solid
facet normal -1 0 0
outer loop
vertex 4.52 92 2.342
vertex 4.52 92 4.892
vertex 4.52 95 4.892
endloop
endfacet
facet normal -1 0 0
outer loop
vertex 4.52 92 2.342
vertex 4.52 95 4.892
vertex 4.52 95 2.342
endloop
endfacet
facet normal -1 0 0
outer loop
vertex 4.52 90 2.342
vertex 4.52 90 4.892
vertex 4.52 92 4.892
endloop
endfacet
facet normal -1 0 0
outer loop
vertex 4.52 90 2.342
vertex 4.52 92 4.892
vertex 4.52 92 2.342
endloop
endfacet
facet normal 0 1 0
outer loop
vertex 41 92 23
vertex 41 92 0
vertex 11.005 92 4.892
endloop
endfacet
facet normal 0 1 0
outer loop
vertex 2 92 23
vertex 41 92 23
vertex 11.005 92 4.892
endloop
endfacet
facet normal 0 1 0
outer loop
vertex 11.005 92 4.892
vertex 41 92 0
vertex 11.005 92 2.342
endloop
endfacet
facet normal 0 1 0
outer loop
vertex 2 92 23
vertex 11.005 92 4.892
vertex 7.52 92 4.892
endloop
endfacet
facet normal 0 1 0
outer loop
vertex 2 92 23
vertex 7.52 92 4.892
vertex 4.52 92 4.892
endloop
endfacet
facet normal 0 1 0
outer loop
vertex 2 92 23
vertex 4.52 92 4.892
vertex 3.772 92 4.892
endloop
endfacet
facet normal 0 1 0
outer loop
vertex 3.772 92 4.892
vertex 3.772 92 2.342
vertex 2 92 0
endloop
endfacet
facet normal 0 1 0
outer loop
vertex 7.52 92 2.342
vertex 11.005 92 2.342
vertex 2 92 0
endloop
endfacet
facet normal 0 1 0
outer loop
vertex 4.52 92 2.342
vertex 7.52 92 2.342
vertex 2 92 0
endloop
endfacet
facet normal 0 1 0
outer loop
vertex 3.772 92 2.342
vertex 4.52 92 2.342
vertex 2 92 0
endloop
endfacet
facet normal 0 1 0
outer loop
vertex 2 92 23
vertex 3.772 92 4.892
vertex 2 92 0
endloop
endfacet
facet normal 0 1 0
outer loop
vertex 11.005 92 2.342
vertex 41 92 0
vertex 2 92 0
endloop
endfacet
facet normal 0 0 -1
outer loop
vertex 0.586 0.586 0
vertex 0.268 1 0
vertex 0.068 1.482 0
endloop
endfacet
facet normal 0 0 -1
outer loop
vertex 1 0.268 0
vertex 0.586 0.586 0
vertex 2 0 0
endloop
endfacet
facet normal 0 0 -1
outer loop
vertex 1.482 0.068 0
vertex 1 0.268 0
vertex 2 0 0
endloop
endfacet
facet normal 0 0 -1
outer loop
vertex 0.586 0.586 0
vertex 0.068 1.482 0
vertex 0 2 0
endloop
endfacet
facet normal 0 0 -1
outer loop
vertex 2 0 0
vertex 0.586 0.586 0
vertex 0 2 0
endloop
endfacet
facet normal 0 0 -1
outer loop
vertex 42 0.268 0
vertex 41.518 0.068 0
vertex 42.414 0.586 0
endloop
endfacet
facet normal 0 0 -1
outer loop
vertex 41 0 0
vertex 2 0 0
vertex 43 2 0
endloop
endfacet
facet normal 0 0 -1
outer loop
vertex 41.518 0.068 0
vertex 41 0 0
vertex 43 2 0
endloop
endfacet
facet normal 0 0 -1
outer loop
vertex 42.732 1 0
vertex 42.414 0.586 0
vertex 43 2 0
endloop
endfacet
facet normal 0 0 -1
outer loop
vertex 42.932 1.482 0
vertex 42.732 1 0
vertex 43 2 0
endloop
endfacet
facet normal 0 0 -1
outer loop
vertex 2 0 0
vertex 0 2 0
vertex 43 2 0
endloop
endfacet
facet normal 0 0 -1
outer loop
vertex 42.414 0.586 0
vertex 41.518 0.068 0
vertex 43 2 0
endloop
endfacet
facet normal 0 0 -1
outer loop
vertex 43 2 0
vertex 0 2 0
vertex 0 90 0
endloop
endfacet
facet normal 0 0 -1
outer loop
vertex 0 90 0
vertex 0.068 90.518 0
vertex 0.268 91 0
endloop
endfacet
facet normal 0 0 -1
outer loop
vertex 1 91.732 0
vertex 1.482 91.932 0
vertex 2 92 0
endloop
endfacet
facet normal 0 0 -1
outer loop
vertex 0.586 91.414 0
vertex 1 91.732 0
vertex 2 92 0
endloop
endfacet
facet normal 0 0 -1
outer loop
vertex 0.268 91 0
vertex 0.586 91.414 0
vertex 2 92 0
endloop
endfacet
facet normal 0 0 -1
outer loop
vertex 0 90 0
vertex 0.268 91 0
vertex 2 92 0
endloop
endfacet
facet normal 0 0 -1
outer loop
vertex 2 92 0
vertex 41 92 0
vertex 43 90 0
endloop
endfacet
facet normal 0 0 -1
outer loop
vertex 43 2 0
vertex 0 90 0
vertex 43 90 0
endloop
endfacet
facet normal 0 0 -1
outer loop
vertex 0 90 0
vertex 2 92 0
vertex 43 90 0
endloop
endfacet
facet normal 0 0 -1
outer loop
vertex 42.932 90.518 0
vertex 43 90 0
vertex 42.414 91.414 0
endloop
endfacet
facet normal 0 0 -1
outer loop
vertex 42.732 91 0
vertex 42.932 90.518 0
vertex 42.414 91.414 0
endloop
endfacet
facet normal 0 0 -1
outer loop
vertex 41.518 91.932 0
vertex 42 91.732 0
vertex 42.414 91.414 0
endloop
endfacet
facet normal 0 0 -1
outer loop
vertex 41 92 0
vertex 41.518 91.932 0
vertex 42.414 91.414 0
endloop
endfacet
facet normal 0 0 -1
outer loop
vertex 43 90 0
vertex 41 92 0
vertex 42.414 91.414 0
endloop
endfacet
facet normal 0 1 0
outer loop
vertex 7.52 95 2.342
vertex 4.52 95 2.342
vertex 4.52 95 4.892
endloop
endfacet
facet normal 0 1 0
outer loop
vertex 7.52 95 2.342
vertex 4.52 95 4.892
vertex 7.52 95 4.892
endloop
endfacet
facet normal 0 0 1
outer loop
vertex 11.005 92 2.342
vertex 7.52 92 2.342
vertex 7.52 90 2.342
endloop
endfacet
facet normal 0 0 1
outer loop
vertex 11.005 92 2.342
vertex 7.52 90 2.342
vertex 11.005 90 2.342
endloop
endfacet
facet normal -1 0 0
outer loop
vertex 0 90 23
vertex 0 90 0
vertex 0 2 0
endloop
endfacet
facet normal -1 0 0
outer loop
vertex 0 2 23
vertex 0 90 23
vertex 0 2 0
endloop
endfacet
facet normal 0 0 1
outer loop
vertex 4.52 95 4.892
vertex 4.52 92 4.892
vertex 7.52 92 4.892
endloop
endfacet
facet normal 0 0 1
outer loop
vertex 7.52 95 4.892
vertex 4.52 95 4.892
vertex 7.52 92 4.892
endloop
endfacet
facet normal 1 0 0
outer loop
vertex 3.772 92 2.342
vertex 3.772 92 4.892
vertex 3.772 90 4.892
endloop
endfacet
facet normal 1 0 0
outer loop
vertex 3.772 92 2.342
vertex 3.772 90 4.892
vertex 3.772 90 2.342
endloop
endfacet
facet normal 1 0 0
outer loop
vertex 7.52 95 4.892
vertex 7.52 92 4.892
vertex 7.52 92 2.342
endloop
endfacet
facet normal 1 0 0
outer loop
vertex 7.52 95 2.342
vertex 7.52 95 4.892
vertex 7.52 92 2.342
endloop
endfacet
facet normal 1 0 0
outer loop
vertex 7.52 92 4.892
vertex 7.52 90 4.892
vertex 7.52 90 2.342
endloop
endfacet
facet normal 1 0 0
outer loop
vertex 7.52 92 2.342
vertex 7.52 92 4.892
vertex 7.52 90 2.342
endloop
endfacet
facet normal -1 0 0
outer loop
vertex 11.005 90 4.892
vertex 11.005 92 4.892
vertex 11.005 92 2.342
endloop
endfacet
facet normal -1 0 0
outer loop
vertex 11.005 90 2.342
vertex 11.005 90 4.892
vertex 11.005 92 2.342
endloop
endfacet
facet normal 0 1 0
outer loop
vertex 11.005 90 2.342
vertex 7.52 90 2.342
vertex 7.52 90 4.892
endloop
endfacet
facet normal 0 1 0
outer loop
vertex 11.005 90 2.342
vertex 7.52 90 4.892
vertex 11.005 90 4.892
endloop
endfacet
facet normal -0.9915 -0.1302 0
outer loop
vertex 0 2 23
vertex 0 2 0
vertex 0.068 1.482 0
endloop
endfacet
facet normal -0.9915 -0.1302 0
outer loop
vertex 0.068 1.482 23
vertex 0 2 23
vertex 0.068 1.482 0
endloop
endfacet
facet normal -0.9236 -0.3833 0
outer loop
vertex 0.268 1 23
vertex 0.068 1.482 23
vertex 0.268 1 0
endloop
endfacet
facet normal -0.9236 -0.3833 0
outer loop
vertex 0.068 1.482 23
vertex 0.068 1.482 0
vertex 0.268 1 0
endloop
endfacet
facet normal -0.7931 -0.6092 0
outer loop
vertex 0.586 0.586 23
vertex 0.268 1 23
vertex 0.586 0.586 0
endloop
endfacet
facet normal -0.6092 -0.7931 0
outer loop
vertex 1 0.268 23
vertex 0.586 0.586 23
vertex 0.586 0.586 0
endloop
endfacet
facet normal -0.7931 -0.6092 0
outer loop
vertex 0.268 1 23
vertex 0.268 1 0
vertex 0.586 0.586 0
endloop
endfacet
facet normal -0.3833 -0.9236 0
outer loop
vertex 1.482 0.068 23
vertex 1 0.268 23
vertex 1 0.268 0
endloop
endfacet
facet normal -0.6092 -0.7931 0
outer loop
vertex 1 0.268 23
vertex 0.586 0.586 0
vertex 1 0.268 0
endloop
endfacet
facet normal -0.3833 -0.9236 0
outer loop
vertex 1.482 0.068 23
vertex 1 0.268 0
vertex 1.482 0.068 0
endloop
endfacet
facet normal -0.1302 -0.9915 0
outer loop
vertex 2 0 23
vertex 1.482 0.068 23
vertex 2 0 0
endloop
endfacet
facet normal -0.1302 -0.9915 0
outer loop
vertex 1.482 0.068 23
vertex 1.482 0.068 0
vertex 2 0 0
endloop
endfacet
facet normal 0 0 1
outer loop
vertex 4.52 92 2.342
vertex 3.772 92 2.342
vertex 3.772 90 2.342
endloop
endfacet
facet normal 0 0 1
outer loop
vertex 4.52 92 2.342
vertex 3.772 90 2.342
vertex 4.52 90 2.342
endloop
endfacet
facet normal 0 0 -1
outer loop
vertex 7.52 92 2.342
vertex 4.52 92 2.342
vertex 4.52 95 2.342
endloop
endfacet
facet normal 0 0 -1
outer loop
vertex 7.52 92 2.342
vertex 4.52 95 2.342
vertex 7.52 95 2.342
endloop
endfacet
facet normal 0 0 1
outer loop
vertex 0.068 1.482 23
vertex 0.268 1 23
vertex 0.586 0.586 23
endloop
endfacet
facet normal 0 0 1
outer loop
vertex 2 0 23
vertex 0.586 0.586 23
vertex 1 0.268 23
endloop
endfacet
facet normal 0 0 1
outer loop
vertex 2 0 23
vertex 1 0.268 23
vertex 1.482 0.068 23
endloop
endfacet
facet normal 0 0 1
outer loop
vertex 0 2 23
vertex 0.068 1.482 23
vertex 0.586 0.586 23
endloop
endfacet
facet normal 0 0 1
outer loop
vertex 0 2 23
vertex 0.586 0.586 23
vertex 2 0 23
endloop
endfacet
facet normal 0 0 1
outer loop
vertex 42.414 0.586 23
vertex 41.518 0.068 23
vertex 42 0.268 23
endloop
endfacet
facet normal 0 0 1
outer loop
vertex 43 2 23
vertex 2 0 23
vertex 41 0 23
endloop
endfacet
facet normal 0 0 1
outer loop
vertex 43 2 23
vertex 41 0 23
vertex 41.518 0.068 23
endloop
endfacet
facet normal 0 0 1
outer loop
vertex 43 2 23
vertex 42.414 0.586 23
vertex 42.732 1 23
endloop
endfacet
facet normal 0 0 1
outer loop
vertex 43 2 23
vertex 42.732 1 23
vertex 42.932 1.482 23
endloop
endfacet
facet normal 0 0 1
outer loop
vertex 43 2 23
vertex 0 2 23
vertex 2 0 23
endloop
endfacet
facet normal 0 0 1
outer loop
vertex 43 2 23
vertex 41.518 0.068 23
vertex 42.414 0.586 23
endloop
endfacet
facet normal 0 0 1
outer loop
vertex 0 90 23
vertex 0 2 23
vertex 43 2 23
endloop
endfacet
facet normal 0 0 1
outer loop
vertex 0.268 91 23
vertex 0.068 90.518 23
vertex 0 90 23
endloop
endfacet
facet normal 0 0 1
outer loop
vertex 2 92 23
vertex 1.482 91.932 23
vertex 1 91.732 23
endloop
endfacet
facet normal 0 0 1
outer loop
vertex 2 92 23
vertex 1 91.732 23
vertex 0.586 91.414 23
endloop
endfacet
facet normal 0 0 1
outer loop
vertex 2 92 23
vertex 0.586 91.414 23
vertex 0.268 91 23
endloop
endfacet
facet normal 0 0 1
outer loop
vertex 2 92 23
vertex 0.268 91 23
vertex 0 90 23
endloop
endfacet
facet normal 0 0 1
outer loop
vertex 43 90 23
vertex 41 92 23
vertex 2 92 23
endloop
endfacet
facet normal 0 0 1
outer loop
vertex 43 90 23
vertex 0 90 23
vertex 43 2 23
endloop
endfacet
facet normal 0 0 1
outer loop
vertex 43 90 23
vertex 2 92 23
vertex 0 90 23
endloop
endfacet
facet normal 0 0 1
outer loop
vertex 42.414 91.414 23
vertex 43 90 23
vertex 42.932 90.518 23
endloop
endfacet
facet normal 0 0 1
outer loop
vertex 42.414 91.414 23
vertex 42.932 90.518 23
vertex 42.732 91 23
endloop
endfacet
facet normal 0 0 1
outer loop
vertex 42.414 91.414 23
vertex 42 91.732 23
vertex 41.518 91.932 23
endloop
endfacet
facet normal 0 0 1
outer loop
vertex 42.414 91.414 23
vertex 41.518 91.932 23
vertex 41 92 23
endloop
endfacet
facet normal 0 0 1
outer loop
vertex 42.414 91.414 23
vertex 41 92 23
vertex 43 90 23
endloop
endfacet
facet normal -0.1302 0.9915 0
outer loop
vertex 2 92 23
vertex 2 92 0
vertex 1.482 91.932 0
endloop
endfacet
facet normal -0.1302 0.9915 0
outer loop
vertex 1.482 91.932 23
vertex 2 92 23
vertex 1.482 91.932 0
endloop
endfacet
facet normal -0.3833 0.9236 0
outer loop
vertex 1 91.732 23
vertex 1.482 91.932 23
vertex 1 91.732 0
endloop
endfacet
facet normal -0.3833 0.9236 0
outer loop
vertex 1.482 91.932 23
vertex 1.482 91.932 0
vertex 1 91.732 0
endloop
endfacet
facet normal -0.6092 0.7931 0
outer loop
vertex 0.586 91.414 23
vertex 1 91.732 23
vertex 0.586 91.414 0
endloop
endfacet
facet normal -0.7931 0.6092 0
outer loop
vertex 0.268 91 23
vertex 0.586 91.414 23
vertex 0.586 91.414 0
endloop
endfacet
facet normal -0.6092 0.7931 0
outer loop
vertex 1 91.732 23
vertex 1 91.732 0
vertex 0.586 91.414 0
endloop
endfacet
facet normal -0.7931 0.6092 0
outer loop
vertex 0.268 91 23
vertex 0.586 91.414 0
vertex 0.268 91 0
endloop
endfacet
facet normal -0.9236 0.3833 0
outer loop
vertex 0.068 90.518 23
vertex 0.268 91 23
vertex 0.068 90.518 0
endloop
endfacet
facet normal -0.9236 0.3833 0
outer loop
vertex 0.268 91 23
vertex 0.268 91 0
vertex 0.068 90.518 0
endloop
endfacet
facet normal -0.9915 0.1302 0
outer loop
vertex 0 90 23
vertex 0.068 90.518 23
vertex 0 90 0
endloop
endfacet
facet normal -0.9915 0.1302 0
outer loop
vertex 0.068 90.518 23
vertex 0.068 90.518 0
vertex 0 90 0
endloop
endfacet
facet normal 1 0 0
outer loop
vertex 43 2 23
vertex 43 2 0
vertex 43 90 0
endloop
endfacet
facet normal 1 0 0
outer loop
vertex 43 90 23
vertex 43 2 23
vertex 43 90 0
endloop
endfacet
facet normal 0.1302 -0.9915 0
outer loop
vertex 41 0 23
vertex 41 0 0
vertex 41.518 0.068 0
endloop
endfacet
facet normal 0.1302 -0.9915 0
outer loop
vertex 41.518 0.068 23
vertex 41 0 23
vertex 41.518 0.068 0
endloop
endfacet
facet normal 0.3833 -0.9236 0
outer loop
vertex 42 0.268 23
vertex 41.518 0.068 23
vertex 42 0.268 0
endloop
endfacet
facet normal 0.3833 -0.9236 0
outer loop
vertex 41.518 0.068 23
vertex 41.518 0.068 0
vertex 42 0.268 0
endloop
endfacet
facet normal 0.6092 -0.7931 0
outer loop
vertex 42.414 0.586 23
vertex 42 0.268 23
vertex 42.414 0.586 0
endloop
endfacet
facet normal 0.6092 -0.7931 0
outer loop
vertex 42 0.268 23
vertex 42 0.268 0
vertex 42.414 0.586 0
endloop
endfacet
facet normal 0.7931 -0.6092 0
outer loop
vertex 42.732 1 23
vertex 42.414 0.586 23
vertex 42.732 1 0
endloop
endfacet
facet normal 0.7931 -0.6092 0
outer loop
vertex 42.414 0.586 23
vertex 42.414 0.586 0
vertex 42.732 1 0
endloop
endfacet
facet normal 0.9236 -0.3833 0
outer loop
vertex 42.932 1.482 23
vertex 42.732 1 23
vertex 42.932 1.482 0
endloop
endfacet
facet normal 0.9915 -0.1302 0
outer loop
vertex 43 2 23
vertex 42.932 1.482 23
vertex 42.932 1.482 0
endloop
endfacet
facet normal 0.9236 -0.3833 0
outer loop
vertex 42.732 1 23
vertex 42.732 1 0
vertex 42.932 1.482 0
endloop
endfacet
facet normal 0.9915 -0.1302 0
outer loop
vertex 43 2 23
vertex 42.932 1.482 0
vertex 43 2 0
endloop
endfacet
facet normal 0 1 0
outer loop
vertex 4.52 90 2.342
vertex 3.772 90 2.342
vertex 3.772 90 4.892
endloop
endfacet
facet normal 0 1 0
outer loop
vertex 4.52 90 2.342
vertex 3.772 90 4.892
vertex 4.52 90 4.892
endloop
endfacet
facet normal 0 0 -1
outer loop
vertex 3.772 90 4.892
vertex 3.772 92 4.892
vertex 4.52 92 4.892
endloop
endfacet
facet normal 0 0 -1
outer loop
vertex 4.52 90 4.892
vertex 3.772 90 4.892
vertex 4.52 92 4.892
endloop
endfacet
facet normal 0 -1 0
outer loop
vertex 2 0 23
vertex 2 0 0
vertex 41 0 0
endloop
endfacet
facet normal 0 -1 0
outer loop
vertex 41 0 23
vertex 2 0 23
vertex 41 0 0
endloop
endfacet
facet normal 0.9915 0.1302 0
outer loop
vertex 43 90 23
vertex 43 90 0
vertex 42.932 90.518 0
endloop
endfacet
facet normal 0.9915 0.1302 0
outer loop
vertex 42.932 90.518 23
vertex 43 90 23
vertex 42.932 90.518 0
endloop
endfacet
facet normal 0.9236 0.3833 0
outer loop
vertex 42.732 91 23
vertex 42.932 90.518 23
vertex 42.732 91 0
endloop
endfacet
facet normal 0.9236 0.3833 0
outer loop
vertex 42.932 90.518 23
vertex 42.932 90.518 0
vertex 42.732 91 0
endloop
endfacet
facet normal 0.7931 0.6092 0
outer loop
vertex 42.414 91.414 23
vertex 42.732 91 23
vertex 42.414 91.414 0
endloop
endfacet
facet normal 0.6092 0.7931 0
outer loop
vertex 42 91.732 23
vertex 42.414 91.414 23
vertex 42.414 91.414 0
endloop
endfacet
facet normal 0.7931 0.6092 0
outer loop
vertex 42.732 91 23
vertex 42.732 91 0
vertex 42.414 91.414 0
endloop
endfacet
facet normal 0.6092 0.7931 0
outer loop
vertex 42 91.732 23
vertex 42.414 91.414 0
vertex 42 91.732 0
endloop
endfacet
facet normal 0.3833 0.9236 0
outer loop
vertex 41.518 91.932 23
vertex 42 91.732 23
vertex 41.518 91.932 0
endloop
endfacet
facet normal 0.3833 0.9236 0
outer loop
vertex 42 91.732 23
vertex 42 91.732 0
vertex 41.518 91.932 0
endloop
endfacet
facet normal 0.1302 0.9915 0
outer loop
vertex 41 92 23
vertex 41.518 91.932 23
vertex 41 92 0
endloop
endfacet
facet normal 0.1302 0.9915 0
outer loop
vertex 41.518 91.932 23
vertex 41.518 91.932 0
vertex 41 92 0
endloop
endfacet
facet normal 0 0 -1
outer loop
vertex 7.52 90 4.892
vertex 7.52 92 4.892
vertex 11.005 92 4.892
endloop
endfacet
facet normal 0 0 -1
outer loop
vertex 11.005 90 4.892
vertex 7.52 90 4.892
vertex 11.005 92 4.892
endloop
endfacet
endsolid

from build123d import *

# Parameters (mm, degrees)
BOSS_EXTRUDE1_DEPTH = 23
SKETCH2_W           = 7.233654816
SKETCH2_H           = 2.549566861
CUT_EXTRUDE1_DEPTH  = 2
SKETCH3_W           = 3
SKETCH3_H           = 2.549566861
BOSS_EXTRUDE2_DEPTH = 5


with BuildPart() as part:
    # Sketch1 → Boss-Extrude1 (new body)
    with BuildSketch(Plane.XY):
        with BuildLine():
            Line((2, 0), (41, 0))
            ThreePointArc((41, 0), (42.414213562, 0.585786438), (43, 2))
            Line((43, 2), (43, 90))
            ThreePointArc((43, 90), (42.414213562, 91.414213562), (41, 92))
            Line((41, 92), (2, 92))
            ThreePointArc((2, 92), (0.585786438, 91.414213562), (0, 90))
            Line((0, 90), (0, 2))
            ThreePointArc((0, 2), (0.585786438, 0.585786438), (2, 0))
        make_face()
    extrude(amount=BOSS_EXTRUDE1_DEPTH)

    # Sketch2 → Cut-Extrude1 (cut)
    with BuildSketch(Plane(origin=(0, 92, 0), x_dir=(1, 0, 0), z_dir=(0, 1, 0))):
        with Locations((7.388443885, -3.61721714)):
            Rectangle(SKETCH2_W, SKETCH2_H)
    extrude(amount=-CUT_EXTRUDE1_DEPTH, mode=Mode.SUBTRACT)

    # Sketch3 → Boss-Extrude2 (add)
    with BuildSketch(Plane(origin=(0, 90, 0), x_dir=(1, 0, 0), z_dir=(0, 1, 0))):
        with Locations((6.019667475, -3.61721714)):
            Rectangle(SKETCH3_W, SKETCH3_H)
    extrude(amount=BOSS_EXTRUDE2_DEPTH)


solid = part.part
